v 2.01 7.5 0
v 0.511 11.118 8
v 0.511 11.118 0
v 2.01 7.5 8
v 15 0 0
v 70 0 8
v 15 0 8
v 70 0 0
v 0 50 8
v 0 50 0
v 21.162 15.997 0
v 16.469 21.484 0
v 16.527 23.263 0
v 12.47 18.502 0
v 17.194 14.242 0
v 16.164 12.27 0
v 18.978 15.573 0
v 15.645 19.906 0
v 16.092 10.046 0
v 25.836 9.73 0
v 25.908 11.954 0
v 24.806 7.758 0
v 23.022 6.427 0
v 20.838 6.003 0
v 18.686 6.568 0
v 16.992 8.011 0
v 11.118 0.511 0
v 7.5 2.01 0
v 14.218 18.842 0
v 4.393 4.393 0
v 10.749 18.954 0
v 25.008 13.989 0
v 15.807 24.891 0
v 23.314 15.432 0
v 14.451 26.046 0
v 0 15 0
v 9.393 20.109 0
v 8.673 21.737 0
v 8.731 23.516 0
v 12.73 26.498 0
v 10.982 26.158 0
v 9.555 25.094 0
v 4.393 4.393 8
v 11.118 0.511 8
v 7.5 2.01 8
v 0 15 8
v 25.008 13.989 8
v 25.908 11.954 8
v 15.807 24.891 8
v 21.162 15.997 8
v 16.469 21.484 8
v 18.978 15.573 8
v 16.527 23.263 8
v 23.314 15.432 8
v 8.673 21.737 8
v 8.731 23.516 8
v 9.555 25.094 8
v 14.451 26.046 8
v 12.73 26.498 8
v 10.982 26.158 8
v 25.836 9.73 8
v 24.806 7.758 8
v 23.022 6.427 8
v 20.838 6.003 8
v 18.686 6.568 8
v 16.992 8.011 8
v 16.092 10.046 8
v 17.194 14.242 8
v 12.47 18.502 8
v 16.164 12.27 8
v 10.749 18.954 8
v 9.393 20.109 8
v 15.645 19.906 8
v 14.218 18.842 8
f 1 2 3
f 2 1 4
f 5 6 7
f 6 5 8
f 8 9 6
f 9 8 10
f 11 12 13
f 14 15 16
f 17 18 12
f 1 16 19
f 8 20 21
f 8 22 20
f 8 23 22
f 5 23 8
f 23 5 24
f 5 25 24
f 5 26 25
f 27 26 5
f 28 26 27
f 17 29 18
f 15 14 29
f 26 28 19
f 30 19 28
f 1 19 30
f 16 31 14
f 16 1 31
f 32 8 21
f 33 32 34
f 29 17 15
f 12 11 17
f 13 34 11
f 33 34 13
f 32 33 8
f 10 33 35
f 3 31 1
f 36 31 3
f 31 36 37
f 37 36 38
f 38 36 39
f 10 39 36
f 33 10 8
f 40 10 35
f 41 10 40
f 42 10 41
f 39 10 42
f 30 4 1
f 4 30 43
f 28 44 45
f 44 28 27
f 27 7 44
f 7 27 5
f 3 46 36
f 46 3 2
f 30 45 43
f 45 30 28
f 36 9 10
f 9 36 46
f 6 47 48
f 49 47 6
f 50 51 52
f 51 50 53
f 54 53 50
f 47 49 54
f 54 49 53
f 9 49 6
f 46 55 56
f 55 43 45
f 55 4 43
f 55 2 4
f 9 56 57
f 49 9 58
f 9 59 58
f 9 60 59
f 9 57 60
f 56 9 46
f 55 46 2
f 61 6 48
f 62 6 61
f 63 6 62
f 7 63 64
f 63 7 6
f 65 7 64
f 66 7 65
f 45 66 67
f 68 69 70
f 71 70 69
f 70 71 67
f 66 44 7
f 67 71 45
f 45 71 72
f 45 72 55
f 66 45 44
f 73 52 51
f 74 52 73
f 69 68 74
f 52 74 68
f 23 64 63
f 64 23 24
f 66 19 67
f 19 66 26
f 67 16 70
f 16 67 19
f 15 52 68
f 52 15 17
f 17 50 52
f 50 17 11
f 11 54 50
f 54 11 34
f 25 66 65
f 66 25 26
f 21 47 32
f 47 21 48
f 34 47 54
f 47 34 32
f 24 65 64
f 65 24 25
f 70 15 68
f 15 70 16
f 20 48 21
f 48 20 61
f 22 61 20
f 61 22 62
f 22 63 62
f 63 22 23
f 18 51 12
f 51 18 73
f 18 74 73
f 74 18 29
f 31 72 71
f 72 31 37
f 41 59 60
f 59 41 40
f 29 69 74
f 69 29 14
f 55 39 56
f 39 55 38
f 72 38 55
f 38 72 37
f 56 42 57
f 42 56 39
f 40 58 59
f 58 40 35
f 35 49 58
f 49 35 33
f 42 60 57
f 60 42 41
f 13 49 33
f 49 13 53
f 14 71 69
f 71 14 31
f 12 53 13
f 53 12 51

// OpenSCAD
$fn = 32;

// ----------------------------------------------------------------------
// Bracket plate: corner pad 70 x 50, fillet R15
// ----------------------------------------------------------------------

// --- parameters (mm) ---
hole_r = 4;               // bolt hole radius
plate_t = 8;              // plate thickness, Z (extrusion height)
leg_a = 70;               // base leg
leg_b = 50;               // height leg
fillet_r = 15;            // right-angle fillet radius

hole_d1 = 2 * hole_r + 2;
hole_d2 = 2 * hole_r;

profile = [[15, 0], [70, 0], [0, 50], [0, 15], [0.511, 11.118], [2.01, 7.5], [4.393, 4.393], [7.5, 2.01], [11.118, 0.511]];  // primary outline, 9 points, counter clockwise
void_1 = [[25.908, 11.954], [25.008, 13.989], [23.314, 15.432], [21.162, 15.997], [18.978, 15.573], [17.194, 14.242], [16.164, 12.27], [16.092, 10.046], [16.992, 8.011], [18.686, 6.568], [20.838, 6.003], [23.022, 6.427], [24.806, 7.758], [25.836, 9.73]];  // mount hole 1, 14 points
void_2 = [[16.527, 23.263], [15.807, 24.891], [14.451, 26.046], [12.73, 26.498], [10.982, 26.158], [9.555, 25.094], [8.731, 23.516], [8.673, 21.737], [9.393, 20.109], [10.749, 18.954], [12.47, 18.502], [14.218, 18.842], [15.645, 19.906], [16.469, 21.484]];  // mount hole 2, 14 points

// --- the one profile operation ---
difference() {
  linear_extrude(height = plate_t) polygon(points = profile);
  translate([0, 0, -1])
    linear_extrude(height = plate_t + 2) polygon(points = void_1);
  translate([0, 0, -1])
    linear_extrude(height = plate_t + 2) polygon(points = void_2);
}
